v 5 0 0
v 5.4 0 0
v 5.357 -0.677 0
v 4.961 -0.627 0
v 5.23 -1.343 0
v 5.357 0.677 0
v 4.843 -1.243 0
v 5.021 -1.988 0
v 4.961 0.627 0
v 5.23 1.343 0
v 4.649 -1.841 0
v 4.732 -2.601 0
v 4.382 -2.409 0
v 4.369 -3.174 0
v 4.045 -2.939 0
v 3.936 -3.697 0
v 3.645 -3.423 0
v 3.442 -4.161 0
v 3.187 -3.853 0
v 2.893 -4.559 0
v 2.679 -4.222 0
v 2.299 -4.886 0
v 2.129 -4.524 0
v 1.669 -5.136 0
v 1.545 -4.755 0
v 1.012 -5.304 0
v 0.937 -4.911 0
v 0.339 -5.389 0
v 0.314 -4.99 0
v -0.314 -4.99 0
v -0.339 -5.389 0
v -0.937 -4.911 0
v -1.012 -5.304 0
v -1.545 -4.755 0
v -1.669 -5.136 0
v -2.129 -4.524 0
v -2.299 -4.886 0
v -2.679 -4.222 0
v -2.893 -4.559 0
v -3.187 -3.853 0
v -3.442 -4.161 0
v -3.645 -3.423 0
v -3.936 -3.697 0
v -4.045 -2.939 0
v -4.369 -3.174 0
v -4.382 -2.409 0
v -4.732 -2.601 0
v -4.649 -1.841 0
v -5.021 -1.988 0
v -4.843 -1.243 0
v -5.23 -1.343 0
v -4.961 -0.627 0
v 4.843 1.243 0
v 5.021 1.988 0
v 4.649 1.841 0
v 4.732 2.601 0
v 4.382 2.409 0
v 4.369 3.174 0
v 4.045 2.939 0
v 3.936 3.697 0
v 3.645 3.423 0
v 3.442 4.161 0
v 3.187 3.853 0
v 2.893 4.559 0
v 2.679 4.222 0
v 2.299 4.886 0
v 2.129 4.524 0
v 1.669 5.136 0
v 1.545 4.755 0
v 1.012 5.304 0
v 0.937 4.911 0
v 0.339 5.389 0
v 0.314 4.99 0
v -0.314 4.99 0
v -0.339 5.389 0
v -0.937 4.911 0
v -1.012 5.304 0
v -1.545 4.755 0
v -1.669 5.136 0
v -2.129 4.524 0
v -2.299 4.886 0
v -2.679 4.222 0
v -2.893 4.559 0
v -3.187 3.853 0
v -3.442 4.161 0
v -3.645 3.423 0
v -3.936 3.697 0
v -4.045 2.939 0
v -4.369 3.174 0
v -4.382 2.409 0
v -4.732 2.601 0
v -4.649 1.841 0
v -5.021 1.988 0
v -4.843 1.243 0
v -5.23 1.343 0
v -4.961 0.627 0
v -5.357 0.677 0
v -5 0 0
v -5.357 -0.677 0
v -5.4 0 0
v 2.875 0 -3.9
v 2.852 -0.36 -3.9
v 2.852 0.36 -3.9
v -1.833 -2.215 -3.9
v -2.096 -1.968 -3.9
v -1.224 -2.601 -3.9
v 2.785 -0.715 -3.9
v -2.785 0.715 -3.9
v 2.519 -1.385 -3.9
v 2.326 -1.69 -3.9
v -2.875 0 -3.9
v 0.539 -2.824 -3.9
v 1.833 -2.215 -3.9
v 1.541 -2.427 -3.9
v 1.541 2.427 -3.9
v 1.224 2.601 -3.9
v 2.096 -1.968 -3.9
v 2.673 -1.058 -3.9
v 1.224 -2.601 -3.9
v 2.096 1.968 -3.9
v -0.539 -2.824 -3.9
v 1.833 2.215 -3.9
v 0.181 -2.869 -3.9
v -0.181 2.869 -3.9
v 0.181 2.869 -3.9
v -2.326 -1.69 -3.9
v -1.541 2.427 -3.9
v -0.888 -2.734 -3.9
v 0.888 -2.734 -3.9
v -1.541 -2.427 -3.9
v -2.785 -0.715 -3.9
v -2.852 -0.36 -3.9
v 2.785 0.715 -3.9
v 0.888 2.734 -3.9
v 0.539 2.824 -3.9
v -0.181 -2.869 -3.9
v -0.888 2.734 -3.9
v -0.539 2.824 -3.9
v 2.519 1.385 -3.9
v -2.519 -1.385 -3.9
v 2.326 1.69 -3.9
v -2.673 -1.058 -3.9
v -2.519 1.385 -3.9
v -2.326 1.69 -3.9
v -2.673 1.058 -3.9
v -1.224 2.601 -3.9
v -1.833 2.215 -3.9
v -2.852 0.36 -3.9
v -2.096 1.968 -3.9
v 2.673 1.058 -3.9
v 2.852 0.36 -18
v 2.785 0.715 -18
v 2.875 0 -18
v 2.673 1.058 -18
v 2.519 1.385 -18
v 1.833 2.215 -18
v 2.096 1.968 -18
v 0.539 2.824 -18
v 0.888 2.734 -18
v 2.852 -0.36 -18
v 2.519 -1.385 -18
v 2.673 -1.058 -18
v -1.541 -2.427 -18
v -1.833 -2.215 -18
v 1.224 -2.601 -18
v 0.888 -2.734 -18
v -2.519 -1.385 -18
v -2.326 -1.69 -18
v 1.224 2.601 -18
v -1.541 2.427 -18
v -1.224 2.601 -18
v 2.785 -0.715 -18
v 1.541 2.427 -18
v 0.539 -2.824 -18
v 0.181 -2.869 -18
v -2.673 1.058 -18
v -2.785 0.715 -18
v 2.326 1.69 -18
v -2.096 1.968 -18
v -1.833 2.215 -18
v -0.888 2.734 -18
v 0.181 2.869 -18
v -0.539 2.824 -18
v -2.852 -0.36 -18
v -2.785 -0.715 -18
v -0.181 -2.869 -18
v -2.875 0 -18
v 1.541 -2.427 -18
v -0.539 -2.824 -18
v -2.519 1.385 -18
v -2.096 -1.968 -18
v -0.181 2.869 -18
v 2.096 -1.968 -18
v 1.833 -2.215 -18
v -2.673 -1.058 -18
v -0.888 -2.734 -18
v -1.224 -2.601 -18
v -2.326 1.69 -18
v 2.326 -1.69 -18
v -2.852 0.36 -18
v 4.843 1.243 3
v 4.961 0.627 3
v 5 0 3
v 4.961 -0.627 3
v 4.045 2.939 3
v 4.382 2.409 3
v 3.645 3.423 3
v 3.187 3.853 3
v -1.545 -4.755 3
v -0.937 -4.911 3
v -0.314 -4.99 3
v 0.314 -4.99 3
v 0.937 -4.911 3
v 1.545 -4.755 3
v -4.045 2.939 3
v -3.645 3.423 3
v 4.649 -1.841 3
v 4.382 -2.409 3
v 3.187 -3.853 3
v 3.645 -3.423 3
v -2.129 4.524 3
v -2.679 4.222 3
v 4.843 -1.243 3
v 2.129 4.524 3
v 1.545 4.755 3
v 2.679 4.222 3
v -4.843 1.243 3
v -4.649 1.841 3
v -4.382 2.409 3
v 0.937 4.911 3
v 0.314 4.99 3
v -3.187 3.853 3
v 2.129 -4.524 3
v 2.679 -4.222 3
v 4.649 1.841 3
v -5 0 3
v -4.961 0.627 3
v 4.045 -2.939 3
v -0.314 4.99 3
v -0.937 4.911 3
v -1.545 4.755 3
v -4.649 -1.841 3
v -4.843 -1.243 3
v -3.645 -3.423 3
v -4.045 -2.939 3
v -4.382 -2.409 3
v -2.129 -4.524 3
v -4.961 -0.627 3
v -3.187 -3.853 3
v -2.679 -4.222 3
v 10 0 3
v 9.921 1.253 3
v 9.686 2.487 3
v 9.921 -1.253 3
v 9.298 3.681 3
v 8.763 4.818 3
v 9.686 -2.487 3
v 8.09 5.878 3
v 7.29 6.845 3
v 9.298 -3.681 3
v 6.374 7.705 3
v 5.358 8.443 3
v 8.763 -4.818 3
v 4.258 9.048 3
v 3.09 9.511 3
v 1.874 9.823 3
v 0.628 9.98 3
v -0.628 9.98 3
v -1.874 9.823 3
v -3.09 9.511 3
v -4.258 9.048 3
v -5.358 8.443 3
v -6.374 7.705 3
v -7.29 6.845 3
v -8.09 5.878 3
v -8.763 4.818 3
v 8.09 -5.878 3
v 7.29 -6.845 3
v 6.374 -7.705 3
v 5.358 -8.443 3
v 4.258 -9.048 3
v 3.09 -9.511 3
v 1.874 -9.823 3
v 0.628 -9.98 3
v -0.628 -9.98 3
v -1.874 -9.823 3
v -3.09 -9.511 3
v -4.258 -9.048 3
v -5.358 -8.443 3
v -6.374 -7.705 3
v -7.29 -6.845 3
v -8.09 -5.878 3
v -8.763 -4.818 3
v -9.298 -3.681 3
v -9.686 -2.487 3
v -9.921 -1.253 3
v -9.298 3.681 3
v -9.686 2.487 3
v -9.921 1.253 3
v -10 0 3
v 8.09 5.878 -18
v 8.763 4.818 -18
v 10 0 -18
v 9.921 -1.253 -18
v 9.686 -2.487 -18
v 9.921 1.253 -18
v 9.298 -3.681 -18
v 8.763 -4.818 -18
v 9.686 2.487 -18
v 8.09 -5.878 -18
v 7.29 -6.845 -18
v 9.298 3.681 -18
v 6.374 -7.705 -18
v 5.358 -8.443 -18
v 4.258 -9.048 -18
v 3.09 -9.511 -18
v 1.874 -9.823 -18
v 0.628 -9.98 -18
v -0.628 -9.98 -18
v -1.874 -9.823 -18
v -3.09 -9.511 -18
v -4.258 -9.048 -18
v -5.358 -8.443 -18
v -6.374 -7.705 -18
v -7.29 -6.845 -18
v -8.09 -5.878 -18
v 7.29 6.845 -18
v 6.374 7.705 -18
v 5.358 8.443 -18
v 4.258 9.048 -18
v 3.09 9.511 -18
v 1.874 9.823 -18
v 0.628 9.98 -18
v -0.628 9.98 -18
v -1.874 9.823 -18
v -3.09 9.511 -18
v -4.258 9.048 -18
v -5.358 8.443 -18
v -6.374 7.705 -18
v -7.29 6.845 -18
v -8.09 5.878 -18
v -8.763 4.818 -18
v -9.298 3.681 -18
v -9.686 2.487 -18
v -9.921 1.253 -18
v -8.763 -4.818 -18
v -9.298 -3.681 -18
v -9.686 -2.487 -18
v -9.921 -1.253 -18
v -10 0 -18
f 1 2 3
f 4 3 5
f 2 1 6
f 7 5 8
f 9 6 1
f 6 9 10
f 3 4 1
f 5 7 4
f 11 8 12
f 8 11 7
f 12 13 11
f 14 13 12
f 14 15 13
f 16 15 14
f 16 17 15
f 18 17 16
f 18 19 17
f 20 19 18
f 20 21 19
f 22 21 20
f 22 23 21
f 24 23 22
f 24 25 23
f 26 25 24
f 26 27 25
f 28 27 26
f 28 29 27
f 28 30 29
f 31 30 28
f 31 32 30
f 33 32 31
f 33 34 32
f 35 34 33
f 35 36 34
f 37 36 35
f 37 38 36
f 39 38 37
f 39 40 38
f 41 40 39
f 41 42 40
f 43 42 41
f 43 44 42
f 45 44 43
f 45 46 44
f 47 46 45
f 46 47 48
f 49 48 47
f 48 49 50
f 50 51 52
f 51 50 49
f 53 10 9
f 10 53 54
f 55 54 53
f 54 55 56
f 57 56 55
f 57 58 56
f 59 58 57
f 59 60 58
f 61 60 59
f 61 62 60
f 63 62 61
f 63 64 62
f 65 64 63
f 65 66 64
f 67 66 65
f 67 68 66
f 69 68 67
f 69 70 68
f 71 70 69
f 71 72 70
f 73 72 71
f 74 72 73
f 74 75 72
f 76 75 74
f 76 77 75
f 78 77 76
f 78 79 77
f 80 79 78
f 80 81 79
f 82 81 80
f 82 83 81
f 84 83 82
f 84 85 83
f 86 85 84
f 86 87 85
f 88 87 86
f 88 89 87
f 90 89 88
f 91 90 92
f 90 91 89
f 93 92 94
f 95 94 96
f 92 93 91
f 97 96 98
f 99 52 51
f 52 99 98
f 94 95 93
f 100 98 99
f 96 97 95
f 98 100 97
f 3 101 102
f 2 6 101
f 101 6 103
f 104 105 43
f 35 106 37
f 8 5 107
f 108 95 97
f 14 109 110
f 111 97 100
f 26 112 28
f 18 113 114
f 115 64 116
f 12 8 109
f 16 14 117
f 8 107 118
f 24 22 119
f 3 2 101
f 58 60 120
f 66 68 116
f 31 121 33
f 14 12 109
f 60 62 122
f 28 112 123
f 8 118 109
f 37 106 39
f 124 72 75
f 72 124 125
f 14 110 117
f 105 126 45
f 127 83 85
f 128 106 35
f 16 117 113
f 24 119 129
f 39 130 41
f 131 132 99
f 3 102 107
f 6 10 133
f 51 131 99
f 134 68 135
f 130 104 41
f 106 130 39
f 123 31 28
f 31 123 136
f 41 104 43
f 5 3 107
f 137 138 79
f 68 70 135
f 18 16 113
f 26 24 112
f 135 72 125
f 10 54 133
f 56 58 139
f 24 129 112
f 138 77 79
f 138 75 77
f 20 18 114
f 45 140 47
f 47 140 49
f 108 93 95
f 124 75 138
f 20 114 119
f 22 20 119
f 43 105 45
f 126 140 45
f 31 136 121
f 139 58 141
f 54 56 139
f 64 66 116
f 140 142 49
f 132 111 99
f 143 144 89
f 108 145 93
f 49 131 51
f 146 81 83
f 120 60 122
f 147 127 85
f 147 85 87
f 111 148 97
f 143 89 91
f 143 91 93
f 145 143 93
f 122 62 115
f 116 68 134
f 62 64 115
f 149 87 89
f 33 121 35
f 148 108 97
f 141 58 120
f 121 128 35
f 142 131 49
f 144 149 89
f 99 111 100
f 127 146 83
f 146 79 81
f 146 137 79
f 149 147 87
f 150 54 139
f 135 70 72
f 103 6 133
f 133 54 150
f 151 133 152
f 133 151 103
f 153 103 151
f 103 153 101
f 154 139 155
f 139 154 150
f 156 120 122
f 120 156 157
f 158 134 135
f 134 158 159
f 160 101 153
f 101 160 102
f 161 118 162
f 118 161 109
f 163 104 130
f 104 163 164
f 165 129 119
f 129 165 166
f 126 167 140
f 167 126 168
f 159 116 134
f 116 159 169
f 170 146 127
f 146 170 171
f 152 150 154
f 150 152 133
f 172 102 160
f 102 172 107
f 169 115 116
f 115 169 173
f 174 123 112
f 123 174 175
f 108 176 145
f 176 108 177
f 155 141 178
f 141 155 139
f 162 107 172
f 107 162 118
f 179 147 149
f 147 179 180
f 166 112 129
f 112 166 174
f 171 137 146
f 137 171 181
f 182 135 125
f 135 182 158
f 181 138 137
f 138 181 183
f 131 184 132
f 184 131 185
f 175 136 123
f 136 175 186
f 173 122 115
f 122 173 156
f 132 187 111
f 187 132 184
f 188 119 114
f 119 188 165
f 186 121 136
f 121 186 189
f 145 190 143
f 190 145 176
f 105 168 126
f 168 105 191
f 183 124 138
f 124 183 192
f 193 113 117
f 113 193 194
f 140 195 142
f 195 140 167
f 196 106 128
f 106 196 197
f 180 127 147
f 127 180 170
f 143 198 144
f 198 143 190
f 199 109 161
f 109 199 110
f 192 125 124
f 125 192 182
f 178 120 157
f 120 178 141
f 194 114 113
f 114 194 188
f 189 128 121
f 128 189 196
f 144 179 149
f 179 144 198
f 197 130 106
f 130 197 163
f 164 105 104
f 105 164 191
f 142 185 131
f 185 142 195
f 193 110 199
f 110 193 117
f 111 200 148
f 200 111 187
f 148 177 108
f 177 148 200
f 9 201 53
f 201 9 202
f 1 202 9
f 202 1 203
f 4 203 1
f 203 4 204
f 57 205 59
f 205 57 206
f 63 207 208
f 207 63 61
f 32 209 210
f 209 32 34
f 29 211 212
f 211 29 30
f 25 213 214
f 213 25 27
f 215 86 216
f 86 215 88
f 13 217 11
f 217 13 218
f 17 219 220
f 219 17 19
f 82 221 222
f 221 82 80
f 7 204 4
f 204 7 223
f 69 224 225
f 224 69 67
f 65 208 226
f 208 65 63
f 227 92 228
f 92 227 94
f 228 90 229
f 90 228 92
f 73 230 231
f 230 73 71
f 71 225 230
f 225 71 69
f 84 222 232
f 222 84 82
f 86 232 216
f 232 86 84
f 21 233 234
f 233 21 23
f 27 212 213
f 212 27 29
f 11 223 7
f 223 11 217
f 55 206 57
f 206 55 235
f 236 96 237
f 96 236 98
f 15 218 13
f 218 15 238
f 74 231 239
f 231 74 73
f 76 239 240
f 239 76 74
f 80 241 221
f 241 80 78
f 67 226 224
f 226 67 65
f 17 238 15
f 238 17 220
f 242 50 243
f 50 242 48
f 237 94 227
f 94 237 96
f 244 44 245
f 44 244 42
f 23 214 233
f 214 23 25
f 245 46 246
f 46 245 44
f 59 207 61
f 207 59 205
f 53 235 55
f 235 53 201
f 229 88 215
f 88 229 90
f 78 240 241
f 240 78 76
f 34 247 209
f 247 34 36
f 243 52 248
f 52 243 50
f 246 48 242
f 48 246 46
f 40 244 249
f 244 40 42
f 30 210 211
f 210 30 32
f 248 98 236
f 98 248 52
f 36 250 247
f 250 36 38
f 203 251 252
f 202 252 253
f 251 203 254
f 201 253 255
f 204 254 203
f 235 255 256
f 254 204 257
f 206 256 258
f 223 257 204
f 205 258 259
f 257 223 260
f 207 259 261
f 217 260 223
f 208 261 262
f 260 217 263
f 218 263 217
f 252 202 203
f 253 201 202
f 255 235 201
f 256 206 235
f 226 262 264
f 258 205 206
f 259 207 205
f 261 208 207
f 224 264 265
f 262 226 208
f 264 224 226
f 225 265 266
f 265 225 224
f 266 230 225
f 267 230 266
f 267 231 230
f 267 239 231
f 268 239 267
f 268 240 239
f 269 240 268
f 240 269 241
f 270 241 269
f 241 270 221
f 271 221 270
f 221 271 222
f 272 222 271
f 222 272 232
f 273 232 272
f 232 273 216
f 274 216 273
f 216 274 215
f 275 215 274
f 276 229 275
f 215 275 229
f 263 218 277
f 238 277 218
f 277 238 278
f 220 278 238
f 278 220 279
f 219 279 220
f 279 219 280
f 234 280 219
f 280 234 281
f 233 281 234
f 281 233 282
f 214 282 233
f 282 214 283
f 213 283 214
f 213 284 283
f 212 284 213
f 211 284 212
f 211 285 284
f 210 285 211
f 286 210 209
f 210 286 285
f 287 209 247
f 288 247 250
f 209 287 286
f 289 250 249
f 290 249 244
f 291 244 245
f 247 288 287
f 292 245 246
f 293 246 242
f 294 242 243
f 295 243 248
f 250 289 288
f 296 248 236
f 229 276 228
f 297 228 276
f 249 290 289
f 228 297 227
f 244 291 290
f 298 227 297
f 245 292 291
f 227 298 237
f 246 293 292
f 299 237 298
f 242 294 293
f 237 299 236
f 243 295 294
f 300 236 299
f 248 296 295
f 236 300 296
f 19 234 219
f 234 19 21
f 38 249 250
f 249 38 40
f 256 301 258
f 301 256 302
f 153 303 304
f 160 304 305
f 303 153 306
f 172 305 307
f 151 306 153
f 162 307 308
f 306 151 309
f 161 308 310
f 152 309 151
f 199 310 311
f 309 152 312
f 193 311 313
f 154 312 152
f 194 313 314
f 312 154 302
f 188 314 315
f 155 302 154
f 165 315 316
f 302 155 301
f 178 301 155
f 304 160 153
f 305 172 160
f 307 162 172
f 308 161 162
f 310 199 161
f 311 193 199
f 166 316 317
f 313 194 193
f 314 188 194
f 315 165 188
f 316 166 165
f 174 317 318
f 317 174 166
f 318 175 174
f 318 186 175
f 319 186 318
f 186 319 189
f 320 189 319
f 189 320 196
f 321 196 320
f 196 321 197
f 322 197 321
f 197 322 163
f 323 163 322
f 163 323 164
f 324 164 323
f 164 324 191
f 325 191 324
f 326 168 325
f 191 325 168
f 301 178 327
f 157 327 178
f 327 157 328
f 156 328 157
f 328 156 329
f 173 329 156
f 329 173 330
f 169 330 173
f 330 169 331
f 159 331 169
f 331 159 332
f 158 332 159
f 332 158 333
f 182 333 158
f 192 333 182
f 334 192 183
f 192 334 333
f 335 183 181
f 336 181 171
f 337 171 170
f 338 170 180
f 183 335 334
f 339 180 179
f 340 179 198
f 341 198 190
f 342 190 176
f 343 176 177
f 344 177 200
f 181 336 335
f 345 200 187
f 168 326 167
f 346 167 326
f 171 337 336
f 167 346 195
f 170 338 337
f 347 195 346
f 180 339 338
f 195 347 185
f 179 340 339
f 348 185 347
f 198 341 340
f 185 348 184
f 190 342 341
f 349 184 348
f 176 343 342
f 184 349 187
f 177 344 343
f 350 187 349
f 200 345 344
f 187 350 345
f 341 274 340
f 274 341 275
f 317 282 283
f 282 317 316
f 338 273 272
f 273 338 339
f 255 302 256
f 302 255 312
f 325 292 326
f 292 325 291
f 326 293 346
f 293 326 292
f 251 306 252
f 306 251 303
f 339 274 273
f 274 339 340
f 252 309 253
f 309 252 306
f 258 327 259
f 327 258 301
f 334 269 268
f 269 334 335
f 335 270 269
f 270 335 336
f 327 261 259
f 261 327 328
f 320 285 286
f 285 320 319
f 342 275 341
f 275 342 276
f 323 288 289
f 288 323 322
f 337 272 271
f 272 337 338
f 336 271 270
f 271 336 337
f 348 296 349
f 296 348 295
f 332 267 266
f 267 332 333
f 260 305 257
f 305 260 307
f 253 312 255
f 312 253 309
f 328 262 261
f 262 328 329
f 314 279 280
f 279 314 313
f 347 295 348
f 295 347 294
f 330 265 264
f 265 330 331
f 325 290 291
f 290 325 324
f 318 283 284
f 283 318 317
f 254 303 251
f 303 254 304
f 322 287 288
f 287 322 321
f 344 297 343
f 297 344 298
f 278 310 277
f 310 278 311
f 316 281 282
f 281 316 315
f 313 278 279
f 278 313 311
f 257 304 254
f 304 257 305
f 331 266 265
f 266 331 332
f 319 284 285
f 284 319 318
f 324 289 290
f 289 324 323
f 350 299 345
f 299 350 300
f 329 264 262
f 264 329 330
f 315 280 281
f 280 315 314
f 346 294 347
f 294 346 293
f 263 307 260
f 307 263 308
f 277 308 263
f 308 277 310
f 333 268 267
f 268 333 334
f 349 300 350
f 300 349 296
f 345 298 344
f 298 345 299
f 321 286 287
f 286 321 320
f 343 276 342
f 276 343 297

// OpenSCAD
$fn = 50;

difference() {
	union() {
		translate(v = [0, 0, -18.0]) {
			cylinder(h = 21, r = 10.0);
		}
	}
	union() {
		translate(v = [0, 0, 0]) {
			rotate(a = [0, 0, 0]) {
				difference() {
					union() {
						translate(v = [0, 0, -21.0]) {
							cylinder(h = 21, r = 2.6);
						}
						translate(v = [0, 0, -3.9]) {
							cylinder(h = 3.9, r1 = 2.875, r2 = 5.4);
						}
						translate(v = [0, 0, -21.0]) {
							cylinder(h = 21, r = 2.875);
						}
						translate(v = [0, 0, -21.0]) {
							cylinder(h = 21, r = 2.6);
						}
					}
					union();
				}
			}
		}
		#cylinder(h = 3, r = 5.0);
	}
}
